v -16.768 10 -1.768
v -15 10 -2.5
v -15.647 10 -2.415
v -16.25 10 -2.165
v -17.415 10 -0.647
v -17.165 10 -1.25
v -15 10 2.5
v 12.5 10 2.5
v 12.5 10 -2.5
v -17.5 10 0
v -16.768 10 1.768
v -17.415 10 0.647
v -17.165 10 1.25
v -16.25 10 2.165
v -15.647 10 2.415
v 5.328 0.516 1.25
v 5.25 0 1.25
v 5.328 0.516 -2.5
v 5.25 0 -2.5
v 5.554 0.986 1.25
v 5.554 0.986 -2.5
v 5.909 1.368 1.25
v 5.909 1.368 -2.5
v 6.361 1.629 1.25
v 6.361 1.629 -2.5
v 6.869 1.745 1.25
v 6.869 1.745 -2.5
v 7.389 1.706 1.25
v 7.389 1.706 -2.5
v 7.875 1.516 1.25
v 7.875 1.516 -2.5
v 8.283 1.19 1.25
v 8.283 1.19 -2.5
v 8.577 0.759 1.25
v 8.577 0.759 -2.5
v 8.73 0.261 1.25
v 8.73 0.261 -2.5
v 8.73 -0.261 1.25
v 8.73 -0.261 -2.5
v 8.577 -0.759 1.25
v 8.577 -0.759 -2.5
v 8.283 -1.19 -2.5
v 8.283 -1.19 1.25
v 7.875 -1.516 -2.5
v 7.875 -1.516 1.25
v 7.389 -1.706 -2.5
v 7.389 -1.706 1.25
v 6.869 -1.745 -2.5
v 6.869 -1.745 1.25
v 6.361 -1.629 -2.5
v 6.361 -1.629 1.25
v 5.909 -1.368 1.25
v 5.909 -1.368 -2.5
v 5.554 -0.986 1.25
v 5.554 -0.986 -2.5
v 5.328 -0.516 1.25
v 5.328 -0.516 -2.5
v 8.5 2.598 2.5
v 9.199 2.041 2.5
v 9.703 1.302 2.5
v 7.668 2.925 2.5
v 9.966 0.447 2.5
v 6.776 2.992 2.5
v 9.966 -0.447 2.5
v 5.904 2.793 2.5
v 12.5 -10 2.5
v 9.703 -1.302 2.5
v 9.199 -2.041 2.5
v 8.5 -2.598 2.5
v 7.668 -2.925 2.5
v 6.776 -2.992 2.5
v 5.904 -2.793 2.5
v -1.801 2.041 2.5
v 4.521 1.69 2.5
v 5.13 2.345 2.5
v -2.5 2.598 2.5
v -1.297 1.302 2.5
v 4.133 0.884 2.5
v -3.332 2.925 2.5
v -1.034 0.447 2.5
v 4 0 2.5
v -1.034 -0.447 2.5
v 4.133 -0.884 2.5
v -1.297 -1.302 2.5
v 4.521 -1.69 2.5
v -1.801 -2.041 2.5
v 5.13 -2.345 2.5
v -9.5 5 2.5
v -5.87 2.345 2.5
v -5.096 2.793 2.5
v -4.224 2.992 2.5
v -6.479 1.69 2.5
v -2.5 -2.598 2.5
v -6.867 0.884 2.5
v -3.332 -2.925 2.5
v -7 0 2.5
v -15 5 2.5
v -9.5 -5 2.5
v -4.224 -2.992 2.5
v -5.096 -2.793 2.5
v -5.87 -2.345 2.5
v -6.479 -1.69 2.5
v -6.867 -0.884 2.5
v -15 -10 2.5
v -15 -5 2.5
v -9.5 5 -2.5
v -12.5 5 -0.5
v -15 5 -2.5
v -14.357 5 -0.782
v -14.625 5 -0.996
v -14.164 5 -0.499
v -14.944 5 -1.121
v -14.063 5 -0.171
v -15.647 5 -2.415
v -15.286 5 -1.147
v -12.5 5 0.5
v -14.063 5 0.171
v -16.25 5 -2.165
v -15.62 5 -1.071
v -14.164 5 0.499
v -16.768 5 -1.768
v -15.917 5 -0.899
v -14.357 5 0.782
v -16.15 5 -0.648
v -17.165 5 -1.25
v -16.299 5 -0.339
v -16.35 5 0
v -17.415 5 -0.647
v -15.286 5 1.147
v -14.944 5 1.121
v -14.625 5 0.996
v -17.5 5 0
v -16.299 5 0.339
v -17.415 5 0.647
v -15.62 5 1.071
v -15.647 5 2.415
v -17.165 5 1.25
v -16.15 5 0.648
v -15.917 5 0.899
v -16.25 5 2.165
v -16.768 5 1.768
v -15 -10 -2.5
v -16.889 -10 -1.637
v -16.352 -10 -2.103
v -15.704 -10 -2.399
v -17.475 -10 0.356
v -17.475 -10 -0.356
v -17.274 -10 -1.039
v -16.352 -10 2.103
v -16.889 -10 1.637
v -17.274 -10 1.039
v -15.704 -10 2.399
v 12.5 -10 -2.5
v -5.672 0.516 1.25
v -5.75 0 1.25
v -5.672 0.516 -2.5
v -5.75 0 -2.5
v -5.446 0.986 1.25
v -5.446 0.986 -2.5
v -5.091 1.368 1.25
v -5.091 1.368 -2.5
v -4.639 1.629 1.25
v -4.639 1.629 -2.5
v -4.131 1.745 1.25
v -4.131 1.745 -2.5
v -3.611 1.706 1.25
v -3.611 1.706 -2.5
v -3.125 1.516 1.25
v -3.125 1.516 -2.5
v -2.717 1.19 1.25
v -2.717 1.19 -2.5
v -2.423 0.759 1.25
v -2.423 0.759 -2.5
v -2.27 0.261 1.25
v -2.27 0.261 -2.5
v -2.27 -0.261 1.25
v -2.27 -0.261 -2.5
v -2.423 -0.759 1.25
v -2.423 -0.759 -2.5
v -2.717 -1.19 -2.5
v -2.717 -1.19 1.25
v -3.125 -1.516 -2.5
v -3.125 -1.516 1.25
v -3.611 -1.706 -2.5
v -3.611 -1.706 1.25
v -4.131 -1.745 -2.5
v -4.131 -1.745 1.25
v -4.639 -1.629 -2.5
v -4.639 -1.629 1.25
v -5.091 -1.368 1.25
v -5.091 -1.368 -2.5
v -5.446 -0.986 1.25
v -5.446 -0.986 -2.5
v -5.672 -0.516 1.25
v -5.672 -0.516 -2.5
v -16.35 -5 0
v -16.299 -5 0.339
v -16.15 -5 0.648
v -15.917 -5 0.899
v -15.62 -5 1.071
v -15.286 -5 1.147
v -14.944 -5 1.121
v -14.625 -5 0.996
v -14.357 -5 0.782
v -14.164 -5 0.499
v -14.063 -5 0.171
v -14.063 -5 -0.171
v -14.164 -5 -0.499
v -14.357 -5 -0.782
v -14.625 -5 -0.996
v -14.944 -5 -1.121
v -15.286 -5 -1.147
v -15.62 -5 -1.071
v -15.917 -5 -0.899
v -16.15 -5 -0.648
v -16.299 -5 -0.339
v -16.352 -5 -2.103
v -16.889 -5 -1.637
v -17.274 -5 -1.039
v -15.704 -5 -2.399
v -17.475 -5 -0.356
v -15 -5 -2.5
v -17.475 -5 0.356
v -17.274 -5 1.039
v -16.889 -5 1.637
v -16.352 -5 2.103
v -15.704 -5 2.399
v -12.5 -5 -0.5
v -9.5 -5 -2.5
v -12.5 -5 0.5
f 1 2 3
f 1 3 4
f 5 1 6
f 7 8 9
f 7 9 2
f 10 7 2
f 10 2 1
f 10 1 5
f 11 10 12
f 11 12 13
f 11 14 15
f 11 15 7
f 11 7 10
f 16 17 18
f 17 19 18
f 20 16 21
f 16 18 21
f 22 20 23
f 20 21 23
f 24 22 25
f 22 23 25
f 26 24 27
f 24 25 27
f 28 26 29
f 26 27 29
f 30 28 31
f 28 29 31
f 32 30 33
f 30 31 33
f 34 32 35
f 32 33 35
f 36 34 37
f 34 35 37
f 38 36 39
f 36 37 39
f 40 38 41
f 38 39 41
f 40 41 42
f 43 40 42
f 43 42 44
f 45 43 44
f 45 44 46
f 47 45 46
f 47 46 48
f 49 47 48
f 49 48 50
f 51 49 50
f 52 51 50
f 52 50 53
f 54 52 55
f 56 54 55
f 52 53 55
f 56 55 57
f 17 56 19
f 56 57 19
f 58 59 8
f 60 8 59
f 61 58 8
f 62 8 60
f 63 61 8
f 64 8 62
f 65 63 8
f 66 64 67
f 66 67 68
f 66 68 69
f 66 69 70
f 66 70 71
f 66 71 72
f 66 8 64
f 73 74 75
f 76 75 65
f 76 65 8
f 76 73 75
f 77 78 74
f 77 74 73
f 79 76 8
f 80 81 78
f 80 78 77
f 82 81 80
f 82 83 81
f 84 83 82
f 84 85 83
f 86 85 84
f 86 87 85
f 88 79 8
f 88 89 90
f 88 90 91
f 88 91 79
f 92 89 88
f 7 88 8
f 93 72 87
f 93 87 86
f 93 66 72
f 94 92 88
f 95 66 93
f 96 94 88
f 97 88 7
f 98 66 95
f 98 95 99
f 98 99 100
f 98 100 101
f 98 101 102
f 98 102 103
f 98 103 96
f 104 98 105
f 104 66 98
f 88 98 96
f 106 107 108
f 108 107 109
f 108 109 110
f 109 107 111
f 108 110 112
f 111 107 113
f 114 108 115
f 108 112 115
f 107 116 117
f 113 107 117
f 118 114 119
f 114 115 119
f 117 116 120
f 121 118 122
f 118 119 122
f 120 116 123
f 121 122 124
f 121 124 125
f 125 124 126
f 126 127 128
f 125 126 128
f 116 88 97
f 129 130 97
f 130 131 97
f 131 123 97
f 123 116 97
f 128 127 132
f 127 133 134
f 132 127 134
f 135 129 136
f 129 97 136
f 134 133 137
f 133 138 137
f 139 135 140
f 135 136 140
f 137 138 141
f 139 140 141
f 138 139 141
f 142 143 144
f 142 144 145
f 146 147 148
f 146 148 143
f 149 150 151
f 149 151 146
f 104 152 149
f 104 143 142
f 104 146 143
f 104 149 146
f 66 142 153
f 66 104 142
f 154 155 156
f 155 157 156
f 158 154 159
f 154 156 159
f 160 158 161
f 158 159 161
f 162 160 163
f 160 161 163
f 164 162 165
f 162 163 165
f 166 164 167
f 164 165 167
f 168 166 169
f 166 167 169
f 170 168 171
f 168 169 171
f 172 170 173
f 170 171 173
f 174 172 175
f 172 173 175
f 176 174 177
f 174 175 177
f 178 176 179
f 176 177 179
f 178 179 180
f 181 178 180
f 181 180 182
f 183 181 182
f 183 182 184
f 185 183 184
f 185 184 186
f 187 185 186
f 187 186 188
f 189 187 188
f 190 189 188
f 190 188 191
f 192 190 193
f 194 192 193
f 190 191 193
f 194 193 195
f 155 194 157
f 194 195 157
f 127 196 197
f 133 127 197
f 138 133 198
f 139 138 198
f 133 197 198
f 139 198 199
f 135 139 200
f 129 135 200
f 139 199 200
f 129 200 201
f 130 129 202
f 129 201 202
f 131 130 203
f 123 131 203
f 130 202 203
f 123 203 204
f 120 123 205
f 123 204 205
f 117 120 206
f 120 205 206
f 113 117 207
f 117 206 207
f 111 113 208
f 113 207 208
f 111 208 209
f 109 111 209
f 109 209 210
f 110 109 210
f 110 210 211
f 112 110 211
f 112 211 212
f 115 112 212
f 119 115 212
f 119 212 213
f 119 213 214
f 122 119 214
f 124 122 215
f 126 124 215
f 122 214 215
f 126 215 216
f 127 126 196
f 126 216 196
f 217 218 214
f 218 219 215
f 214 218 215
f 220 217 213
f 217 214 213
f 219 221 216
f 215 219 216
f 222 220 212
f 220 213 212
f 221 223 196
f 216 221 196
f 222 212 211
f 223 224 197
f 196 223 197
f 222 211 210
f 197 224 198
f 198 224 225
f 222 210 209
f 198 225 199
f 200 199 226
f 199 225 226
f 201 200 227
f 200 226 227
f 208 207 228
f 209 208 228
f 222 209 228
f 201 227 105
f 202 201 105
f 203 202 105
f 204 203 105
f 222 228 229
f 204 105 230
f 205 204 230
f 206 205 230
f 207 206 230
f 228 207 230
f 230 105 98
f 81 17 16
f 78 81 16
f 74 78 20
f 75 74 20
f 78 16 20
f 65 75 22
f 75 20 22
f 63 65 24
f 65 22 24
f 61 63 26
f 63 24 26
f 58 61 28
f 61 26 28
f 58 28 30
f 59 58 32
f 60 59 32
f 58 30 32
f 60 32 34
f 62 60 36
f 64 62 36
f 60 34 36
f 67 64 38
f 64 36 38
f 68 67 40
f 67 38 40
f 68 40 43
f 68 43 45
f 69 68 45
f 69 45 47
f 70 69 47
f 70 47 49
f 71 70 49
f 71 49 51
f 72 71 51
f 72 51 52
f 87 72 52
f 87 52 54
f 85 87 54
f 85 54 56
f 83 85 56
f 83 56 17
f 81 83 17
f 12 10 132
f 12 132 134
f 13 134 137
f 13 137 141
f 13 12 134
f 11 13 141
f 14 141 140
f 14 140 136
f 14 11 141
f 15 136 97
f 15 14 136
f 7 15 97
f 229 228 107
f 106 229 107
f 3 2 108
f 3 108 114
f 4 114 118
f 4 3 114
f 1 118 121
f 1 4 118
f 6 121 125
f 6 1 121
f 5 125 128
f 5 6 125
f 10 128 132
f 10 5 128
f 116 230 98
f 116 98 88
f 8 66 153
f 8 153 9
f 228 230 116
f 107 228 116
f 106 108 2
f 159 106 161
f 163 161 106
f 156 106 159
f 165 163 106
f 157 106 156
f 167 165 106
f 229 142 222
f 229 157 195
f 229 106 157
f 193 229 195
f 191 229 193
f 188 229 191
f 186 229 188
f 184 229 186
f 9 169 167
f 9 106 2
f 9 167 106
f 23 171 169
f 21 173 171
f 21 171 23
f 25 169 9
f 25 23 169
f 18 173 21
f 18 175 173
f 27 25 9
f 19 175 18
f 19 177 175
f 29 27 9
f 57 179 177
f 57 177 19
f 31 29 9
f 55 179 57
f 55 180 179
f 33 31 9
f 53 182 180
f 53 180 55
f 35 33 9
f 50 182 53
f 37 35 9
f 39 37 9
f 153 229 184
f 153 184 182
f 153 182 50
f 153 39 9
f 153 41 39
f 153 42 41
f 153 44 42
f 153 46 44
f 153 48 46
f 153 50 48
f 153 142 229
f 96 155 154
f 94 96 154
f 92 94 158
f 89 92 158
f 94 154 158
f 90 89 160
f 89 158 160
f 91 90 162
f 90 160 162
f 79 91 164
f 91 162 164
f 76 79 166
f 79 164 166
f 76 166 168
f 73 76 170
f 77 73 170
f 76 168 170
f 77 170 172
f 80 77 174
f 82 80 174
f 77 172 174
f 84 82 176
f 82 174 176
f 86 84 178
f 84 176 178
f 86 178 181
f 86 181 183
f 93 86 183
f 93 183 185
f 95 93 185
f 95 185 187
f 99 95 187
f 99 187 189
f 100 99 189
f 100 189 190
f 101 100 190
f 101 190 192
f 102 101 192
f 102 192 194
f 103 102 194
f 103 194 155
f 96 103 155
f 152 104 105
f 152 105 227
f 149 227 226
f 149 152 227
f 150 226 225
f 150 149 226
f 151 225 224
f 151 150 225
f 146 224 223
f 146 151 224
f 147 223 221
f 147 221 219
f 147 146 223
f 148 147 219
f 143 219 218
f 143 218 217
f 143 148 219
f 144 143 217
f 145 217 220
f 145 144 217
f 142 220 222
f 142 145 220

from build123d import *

# Parameters (mm, degrees)
F0_W            = 25
F0_H            = 20
F1_DEPTH        = 2.5
F3_DEPTH        = 5
F5_DEPTH        = 5
F6_R            = 1.15
F7_DEPTH        = 10
F8_SIZE2        = 2
F8_SIZE         = 3
F10_D           = 3.5
F10_CSINK_D     = 6
F10_CSINK_ANGLE = 90


with BuildPart() as f1:
    # F0 (on Top) → F1 (new body, symmetric)
    with BuildSketch(Plane.XY):
        Rectangle(F0_W, F0_H)
    extrude(amount=F1_DEPTH, both=True)

    # F2 (on face) → F3 (join)
    with BuildSketch(Plane(origin=(0, 10, 0), x_dir=(-1, 0, 0), z_dir=(0, 1, 0))):
        with BuildLine():
            ThreePointArc((15, -2.5), (16.767767, -1.767767), (17.5, 0))
            ThreePointArc((17.5, 0), (16.767767, 1.767767), (15, 2.5))
            ThreePointArc((15, 2.5), (13.232233, 1.767767), (12.5, 0))
            ThreePointArc((12.5, 0), (13.232233, -1.767767), (15, -2.5))
        make_face()
        with BuildLine():
            ThreePointArc((12.5, 0), (13.232233, 1.767767), (15, 2.5))
            Line((15, 2.5), (12.5, 2.5))
            Line((12.5, 2.5), (12.5, 0))
        make_face()
        with BuildLine():
            Line((12.5, -2.5), (15, -2.5))
            ThreePointArc((15, -2.5), (13.232233, -1.767767), (12.5, 0))
            Line((12.5, 0), (12.5, -2.5))
        make_face()
    extrude(amount=-F3_DEPTH)

    # F4 (on face) → F5 (join)
    with BuildSketch(Plane.XZ.offset(10)):
        with BuildLine():
            ThreePointArc((-15, -2.5), (-13.232233, -1.767767), (-12.5, 0))
            ThreePointArc((-12.5, 0), (-13.232233, 1.767767), (-15, 2.5))
            ThreePointArc((-15, 2.5), (-17.5, 0), (-15, -2.5))
        make_face()
        with BuildLine():
            Line((-12.5, -2.5), (-12.5, 0))
            ThreePointArc((-12.5, 0), (-13.232233, -1.767767), (-15, -2.5))
            Line((-15, -2.5), (-12.5, -2.5))
        make_face()
        with BuildLine():
            ThreePointArc((-15, 2.5), (-13.232233, 1.767767), (-12.5, 0))
            Line((-12.5, 0), (-12.5, 2.5))
            Line((-12.5, 2.5), (-15, 2.5))
        make_face()
    extrude(amount=-F5_DEPTH)

    # F6 (on face) → F7 (join)
    with BuildSketch(Plane(origin=(0, -5, 0), x_dir=(-1, 0, 0), z_dir=(0, 1, 0))):
        with Locations((15.2, 0)):
            Circle(F6_R)
    extrude(amount=F7_DEPTH)

    # F8
    f8_edges = [f1.edges().sort_by_distance(p)[0] for p in [
        (-12.5, 0, -2.5),
        (-12.5, 0, 2.5),
    ]]
    chamfer(f8_edges, length=F8_SIZE, length2=F8_SIZE2)

    # F10 (through all)
    with Locations(Plane.XY.offset(2.5)):
        with Locations((-4, 0), (7, 0)):
            CounterSinkHole(F10_D / 2, F10_CSINK_D / 2, counter_sink_angle=F10_CSINK_ANGLE)


solid = f1.part
